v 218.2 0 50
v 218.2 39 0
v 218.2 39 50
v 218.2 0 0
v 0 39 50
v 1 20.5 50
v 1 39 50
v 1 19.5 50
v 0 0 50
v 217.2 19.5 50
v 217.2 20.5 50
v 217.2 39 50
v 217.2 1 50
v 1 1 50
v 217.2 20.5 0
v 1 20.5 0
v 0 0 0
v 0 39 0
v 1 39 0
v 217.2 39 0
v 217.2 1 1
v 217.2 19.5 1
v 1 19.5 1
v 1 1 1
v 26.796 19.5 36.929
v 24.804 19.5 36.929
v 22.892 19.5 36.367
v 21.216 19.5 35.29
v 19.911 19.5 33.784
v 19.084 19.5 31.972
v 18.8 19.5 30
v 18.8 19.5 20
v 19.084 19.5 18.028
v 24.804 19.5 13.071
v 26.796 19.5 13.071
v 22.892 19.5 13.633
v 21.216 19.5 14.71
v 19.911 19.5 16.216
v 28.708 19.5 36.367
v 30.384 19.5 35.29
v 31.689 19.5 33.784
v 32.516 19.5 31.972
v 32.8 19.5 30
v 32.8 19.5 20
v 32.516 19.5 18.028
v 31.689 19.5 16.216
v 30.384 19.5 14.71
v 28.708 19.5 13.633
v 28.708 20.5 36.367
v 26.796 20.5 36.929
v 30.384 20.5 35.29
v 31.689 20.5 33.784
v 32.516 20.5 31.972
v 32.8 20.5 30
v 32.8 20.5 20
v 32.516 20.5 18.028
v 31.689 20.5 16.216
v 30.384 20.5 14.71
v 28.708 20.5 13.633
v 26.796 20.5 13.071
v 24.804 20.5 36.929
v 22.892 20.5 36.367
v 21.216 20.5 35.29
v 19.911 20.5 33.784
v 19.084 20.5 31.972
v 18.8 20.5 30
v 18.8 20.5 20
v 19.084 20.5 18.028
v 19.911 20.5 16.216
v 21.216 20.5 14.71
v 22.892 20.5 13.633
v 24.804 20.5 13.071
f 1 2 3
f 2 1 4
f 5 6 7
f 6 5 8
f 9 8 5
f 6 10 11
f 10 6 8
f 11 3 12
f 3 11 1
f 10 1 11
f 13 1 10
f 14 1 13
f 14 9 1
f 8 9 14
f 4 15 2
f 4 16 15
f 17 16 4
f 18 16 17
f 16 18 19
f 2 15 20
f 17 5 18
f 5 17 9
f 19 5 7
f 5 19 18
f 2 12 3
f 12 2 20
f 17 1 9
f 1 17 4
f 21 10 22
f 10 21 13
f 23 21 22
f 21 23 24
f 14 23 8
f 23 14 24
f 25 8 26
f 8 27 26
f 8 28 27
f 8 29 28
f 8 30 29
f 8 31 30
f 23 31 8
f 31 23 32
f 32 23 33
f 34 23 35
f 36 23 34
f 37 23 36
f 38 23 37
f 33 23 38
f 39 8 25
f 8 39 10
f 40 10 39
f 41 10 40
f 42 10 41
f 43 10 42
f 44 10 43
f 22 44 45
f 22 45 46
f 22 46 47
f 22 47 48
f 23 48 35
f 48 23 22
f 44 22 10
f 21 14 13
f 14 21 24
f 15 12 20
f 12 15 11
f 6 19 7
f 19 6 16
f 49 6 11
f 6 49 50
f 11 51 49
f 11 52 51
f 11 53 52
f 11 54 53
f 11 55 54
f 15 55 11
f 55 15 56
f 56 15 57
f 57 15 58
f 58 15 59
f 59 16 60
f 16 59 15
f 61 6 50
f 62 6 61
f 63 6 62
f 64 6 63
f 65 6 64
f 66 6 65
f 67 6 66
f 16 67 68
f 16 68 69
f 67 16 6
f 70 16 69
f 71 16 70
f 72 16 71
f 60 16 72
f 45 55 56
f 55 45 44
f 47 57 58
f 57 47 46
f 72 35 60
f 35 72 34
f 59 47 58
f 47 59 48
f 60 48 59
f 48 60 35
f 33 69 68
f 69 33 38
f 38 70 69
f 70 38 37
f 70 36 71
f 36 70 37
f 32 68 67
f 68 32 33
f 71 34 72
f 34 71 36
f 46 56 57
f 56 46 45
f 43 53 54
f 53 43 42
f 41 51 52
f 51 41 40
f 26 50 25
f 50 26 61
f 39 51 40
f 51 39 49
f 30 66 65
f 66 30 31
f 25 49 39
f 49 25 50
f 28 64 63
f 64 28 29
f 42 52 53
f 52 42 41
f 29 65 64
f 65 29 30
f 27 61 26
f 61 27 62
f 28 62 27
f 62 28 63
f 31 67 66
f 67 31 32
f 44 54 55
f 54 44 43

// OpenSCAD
x=216.2;
y=18.5;
v=1;
h=50;

difference() {
    cube([x+2*v,2*y+2*v,h]);
    translate([v,v,v]) cube([x,y,h]);
    translate([v,v+y+v,-.1]) cube([x,y+v,h+v]);
  
    translate([25.8,y*2,20]) {
        rotate(a=[90,0,0]) cylinder(h=20,r=7);
    };
    translate([25.8,y*2,30]) {
        rotate(a=[90,0,0]) cylinder(h=20,r=7);
    };
    
    translate([25.8-7,y*2,20]) {
        rotate(a=[90,0,0]) cube([14,10,20]);
    };
};      
